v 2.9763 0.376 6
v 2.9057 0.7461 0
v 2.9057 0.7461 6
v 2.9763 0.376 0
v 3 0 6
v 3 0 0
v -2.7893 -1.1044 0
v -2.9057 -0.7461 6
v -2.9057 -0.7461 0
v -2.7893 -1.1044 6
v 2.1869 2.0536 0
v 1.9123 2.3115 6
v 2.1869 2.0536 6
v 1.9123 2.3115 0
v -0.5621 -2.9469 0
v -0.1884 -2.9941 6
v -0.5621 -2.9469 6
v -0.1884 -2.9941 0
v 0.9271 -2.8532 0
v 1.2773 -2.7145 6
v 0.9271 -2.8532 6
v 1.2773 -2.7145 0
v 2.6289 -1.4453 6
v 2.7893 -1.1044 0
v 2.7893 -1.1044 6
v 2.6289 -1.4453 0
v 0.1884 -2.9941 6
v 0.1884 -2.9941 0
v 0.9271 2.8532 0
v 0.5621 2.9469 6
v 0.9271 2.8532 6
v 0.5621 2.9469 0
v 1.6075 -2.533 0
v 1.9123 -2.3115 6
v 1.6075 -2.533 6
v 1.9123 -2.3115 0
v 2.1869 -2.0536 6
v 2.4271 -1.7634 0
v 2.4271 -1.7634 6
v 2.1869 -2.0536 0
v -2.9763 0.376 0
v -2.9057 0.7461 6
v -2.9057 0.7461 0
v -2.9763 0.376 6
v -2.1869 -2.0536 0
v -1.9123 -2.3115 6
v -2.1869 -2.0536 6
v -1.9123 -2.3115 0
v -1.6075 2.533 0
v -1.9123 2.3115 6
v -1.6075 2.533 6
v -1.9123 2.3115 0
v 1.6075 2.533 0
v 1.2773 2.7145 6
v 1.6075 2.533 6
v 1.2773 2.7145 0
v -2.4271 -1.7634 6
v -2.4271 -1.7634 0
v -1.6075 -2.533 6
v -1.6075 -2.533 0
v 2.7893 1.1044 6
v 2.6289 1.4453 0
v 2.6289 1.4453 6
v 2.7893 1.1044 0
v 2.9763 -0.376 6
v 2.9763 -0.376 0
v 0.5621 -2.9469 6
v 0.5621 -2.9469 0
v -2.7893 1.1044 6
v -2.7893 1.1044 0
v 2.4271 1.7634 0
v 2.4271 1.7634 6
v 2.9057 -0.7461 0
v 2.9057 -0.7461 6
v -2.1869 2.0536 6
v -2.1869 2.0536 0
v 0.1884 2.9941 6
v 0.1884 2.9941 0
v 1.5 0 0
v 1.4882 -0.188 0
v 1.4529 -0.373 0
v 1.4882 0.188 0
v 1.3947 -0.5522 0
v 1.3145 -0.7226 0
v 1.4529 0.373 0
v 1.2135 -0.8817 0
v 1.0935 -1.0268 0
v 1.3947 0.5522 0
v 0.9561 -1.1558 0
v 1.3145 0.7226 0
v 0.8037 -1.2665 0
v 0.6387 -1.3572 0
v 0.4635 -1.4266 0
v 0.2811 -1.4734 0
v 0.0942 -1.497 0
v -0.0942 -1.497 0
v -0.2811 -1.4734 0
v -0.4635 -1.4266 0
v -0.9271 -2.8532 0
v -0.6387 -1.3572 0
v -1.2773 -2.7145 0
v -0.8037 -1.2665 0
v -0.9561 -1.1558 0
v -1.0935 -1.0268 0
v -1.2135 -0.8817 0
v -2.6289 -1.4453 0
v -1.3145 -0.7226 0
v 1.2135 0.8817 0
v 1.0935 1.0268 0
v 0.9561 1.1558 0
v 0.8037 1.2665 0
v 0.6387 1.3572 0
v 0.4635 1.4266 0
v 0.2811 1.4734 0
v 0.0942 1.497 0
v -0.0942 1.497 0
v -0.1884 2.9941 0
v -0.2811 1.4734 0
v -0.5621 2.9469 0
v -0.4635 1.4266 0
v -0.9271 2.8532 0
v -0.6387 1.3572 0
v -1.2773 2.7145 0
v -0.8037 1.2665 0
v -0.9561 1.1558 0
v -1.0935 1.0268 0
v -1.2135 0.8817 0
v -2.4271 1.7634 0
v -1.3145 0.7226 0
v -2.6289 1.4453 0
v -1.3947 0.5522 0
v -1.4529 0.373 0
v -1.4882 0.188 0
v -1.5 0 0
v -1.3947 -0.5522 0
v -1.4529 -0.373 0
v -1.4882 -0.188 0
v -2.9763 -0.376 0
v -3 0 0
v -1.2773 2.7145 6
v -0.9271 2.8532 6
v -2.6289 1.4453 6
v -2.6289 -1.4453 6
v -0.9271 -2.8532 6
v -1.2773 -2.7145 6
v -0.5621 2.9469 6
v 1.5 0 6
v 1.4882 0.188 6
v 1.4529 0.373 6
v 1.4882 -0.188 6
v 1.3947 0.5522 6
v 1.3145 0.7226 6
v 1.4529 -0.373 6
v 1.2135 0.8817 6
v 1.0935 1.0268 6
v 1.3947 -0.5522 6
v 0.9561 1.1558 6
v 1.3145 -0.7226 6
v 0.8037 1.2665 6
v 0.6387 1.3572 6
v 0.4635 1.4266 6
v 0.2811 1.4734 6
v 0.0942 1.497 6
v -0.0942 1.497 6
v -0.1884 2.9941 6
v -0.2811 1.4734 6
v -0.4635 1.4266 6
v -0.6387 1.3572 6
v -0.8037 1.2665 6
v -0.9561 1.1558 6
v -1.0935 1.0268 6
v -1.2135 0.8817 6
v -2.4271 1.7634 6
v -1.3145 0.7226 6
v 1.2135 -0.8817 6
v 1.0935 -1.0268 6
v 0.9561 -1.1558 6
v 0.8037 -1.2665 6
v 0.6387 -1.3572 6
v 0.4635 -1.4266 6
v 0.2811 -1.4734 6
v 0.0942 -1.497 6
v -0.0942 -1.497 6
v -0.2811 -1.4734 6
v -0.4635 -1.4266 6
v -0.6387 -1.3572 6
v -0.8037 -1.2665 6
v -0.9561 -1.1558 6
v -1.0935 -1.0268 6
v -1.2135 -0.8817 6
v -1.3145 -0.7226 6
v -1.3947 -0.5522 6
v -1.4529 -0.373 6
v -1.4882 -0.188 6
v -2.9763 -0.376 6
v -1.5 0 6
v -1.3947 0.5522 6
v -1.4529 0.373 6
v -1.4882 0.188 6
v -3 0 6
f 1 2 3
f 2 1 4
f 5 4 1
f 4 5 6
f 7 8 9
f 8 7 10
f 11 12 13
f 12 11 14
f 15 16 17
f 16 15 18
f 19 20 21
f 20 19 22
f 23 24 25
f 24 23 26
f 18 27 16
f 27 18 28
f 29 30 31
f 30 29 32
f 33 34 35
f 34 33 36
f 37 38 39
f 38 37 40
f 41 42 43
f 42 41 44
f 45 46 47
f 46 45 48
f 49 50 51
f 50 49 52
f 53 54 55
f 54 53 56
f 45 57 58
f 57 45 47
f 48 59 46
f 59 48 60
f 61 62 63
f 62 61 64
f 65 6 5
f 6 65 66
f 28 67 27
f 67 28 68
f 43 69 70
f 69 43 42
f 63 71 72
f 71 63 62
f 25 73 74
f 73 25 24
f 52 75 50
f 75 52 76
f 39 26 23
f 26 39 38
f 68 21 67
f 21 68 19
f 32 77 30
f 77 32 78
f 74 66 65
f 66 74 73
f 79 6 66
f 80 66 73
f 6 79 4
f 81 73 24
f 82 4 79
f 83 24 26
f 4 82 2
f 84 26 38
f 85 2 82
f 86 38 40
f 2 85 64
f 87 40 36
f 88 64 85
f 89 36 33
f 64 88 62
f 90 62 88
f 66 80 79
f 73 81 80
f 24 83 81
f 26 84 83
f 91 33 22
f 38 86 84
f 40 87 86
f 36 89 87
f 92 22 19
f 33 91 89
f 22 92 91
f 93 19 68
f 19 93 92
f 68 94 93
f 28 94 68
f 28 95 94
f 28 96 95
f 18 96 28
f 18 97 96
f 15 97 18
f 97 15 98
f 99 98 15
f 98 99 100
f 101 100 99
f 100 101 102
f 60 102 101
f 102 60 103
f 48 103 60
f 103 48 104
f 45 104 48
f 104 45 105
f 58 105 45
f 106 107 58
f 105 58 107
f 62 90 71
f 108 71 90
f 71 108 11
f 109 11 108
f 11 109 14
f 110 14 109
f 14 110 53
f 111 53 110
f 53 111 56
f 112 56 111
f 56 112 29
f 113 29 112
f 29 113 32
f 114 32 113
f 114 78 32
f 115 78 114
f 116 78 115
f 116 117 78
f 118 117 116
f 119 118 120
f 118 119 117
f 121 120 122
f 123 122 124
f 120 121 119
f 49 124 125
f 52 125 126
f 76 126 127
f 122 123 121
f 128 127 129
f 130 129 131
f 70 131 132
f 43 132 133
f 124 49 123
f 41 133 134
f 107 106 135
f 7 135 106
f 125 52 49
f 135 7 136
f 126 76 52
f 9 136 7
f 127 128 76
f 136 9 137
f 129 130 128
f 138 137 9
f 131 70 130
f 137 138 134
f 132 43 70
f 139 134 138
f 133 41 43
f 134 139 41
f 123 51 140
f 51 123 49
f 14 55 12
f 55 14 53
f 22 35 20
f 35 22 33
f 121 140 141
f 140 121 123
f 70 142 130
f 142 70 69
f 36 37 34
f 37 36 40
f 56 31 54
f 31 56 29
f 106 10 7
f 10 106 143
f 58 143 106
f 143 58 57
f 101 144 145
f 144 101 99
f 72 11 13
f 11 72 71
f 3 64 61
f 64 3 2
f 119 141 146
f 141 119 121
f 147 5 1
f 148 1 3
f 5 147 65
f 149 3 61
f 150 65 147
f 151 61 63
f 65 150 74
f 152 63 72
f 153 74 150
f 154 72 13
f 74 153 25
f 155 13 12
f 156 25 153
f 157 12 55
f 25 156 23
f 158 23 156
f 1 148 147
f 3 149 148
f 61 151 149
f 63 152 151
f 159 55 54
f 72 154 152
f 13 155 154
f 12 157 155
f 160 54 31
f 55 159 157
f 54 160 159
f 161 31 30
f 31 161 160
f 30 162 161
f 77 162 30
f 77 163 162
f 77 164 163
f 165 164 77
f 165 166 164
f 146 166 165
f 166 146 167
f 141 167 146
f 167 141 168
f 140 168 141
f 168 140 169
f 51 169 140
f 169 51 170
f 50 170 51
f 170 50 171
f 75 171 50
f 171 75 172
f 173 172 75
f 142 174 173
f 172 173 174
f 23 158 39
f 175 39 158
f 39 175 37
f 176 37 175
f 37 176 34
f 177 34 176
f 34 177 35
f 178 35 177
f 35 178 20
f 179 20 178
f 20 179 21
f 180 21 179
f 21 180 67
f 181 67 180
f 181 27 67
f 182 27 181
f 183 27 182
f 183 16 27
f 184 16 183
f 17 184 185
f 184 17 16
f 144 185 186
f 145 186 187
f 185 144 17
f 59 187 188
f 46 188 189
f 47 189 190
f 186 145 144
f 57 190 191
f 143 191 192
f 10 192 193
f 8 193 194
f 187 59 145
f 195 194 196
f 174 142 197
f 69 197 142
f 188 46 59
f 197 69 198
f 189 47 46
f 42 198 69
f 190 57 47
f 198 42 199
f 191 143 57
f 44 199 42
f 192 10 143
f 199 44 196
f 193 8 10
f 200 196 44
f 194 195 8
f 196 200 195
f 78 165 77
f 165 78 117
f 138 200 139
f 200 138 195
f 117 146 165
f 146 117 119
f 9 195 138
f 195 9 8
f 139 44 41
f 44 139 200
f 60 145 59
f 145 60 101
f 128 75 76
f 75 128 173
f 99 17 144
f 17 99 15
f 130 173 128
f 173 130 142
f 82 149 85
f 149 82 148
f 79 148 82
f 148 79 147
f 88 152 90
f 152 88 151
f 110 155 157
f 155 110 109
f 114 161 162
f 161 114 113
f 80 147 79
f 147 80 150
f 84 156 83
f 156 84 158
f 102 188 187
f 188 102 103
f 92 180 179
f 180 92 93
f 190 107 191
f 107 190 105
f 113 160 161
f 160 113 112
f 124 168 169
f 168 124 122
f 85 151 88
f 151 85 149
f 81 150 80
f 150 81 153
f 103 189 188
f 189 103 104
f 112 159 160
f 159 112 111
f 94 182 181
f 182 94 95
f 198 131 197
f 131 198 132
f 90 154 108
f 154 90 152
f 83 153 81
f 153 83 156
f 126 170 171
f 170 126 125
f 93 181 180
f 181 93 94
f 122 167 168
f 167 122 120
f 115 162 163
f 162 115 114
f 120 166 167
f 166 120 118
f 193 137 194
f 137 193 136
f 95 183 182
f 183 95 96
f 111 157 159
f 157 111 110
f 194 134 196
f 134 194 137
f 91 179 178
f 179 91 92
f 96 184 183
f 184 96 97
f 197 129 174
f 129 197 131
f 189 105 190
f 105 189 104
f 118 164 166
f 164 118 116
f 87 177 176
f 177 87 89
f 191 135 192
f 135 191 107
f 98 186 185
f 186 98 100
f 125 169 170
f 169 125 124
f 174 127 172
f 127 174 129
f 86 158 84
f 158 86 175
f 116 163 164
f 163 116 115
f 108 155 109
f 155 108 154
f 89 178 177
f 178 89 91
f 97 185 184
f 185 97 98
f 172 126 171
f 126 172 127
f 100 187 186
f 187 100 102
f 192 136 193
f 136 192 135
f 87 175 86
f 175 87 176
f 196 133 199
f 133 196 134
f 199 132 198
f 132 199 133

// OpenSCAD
// Distance holder
// for use in electronics & mechanical projects
// Example size for M3 bolts x 6 x 6 mm

$fn=50;

//Parameters:
height = 6; 
od = 6; //Outer Diameter
id = 3; //Inner Diameter

difference () {
cylinder(h=height, d=od);
cylinder(h=height, d=id);  
}
